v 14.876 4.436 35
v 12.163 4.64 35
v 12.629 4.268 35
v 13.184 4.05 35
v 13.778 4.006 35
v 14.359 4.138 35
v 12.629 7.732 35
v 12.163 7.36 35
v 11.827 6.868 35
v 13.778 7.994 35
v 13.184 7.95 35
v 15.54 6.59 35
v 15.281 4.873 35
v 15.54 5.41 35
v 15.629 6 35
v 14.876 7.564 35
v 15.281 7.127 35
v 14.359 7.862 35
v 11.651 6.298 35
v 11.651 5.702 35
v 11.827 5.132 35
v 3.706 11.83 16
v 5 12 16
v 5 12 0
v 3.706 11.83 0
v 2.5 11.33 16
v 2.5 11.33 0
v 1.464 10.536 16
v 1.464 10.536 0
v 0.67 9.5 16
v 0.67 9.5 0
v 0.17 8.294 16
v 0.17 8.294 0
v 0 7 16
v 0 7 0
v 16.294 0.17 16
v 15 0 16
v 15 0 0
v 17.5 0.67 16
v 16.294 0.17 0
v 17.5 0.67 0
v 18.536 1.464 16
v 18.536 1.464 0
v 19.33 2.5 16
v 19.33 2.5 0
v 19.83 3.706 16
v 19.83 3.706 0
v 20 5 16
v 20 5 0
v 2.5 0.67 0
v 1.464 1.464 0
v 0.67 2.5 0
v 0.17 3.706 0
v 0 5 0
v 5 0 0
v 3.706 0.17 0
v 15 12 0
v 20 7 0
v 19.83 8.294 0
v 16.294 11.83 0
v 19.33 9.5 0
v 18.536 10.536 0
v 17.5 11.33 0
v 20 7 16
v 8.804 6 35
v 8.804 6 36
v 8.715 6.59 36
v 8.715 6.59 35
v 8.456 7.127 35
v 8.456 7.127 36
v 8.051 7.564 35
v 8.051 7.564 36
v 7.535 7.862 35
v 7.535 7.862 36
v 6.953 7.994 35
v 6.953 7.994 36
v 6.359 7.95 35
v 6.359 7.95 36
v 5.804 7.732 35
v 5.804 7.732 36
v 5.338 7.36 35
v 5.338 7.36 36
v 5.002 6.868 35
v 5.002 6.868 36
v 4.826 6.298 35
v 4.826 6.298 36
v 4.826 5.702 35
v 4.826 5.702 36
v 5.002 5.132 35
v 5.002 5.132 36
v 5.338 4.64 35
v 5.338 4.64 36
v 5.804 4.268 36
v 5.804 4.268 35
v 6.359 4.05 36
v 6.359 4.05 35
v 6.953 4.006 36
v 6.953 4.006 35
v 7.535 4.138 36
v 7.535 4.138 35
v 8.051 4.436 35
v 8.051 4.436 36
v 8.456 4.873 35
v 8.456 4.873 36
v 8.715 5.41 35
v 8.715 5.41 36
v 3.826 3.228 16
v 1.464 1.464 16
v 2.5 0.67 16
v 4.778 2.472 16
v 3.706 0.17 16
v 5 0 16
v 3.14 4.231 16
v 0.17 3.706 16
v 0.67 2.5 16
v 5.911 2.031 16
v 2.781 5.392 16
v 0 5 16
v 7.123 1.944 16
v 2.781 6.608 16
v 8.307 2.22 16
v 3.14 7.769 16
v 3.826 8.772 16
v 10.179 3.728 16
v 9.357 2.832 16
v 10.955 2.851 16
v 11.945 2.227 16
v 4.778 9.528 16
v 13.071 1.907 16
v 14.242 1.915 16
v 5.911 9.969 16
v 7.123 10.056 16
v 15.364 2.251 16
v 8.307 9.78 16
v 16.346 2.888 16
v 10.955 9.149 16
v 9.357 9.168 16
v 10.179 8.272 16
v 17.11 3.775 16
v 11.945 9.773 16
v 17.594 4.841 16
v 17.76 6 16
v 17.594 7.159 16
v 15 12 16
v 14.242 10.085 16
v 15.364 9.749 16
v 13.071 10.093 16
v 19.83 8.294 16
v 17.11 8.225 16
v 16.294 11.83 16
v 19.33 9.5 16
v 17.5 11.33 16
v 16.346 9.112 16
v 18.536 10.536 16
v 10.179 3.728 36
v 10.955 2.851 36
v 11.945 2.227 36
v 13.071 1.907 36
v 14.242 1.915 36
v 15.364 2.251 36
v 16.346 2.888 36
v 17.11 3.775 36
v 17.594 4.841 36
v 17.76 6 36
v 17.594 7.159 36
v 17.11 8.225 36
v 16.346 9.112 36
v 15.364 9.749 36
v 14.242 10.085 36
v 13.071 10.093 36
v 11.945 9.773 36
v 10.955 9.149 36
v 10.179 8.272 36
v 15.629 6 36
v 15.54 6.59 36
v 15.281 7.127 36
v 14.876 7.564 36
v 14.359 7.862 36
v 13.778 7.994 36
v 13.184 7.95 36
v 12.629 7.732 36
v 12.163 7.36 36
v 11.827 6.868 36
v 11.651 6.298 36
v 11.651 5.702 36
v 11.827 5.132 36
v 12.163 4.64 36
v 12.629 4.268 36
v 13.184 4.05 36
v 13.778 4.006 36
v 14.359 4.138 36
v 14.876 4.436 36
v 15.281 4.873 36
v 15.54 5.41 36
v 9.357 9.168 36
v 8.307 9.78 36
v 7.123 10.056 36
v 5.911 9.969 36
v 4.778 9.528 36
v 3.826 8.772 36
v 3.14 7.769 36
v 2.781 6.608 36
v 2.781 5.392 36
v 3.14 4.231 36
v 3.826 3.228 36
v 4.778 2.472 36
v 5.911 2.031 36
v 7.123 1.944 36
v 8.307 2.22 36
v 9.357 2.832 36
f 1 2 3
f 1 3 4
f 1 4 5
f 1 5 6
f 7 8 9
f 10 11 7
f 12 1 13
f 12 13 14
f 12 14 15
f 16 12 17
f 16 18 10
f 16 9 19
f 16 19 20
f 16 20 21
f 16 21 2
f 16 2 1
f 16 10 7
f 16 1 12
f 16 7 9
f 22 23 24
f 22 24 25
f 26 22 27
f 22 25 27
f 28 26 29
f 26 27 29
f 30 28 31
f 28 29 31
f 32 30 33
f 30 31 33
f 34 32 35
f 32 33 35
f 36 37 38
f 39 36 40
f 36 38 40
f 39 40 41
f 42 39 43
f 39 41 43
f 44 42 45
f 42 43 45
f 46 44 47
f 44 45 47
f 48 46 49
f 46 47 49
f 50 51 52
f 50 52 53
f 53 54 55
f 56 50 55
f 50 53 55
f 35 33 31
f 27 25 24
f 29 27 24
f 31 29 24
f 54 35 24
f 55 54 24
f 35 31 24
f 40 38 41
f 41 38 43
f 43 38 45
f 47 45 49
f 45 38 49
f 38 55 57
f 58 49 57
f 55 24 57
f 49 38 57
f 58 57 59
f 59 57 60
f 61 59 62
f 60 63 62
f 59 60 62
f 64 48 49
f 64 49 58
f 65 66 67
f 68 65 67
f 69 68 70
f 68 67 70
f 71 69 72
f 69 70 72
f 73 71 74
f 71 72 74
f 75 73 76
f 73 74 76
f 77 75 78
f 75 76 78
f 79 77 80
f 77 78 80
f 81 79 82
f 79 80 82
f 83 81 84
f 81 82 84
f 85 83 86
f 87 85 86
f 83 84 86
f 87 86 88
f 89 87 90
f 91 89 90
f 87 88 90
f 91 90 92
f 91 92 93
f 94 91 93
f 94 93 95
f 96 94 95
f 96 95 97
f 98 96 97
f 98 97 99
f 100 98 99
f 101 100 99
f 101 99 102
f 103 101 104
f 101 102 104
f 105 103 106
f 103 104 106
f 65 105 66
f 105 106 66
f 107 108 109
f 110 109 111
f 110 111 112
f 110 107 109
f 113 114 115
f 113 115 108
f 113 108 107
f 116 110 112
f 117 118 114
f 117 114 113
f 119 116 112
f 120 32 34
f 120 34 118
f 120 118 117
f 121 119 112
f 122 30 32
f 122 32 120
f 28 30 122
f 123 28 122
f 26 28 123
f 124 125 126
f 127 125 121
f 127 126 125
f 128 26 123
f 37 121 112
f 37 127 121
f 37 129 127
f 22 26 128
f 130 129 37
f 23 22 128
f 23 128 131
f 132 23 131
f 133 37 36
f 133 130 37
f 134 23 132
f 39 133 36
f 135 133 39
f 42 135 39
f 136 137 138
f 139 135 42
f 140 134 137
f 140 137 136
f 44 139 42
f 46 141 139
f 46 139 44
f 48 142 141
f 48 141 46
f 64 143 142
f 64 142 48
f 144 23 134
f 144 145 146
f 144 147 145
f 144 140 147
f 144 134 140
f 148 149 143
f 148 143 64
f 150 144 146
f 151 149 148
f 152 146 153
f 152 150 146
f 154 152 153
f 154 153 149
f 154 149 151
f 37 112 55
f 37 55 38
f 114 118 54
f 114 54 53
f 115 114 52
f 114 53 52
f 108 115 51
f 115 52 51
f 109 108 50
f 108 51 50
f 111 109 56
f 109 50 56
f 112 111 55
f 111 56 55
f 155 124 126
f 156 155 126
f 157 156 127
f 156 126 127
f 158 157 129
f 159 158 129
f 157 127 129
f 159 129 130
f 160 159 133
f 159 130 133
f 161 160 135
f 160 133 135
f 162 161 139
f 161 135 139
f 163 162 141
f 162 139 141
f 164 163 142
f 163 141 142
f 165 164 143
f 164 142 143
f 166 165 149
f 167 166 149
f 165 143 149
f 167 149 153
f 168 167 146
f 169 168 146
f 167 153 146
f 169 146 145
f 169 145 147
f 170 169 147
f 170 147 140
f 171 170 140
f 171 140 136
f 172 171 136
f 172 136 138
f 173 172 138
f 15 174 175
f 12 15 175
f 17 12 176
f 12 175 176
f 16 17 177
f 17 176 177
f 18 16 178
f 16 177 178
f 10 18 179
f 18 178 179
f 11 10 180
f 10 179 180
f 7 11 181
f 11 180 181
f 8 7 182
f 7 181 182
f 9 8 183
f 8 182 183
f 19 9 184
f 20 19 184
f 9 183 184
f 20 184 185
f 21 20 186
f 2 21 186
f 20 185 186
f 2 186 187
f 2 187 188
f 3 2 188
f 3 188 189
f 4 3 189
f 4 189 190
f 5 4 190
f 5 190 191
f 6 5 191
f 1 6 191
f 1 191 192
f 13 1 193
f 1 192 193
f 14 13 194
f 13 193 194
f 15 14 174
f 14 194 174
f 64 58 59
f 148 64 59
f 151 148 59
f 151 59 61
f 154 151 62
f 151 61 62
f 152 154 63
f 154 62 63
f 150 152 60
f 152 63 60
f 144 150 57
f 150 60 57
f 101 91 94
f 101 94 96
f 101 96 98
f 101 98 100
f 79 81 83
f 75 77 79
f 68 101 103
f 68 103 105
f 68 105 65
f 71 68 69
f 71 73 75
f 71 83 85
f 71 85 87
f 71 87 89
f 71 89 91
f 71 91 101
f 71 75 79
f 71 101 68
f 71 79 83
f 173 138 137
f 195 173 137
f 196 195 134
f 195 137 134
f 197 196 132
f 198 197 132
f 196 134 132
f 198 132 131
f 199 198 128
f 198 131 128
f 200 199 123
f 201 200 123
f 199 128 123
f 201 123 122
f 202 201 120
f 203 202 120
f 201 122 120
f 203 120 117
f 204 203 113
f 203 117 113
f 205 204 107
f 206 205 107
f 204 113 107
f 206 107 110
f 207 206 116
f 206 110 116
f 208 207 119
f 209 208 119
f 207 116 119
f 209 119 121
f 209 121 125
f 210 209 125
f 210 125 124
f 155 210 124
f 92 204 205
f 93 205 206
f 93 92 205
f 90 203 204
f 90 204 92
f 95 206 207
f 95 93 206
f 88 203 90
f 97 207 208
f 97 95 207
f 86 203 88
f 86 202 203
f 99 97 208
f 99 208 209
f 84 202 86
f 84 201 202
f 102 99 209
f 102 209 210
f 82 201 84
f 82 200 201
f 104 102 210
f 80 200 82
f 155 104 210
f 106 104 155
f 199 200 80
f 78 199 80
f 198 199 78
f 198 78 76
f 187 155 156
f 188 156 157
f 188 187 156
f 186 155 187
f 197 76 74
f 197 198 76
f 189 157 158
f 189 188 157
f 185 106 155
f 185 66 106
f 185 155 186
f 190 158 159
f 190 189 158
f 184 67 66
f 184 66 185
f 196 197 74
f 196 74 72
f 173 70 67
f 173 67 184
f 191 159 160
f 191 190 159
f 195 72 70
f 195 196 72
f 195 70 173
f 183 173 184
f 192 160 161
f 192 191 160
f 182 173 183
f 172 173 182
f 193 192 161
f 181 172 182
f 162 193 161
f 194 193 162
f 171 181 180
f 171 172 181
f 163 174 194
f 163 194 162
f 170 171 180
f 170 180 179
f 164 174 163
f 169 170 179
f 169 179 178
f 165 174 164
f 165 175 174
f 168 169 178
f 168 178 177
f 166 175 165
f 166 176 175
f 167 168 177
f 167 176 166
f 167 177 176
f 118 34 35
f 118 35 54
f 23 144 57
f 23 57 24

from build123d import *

# Parameters (mm, degrees)
EXTRUDE_1_DEPTH     = 16
EXTRUDE_3_DEPTH     = 20
SKETCH_4_R          = 2
CUT_EXTRUDE_1_DEPTH = 1


with BuildPart() as part:
    # ｽｹｯﾁ1 → ﾎﾞｽ - 押し出し1 (new body)
    with BuildSketch(Plane.XY):
        with BuildLine():
            Line((5, 0), (15, 0))
            ThreePointArc((15, 0), (18.535533906, 1.464466094), (20, 5))
            Line((20, 5), (20, 7))
            ThreePointArc((20, 7), (18.535533906, 10.535533906), (15, 12))
            Line((15, 12), (5, 12))
            ThreePointArc((5, 12), (1.464466094, 10.535533906), (0, 7))
            Line((0, 7), (0, 5))
            ThreePointArc((0, 5), (1.464466094, 1.464466094), (5, 0))
        make_face()
    extrude(amount=EXTRUDE_1_DEPTH)

    # ｽｹｯﾁ3 → ﾎﾞｽ - 押し出し3 (add)
    with BuildSketch(Plane.XY.offset(16)):
        with BuildLine():
            ThreePointArc((10.178530878, 3.727869439), (17.760027495, 6), (10.178530878, 8.272130561))
            ThreePointArc((10.178530878, 8.272130561), (2.735636676, 6), (10.178530878, 3.727869439))
        make_face()
    extrude(amount=EXTRUDE_3_DEPTH)

    # ｽｹｯﾁ4 → ｶｯﾄ - 押し出し1 (cut)
    with BuildSketch(Plane.XY.offset(36)):
        with Locations((6.803896263, 6)):
            Circle(SKETCH_4_R)
        with Locations((13.628807012, 6)):
            Circle(SKETCH_4_R)
    extrude(amount=-CUT_EXTRUDE_1_DEPTH, mode=Mode.SUBTRACT)


solid = part.part
